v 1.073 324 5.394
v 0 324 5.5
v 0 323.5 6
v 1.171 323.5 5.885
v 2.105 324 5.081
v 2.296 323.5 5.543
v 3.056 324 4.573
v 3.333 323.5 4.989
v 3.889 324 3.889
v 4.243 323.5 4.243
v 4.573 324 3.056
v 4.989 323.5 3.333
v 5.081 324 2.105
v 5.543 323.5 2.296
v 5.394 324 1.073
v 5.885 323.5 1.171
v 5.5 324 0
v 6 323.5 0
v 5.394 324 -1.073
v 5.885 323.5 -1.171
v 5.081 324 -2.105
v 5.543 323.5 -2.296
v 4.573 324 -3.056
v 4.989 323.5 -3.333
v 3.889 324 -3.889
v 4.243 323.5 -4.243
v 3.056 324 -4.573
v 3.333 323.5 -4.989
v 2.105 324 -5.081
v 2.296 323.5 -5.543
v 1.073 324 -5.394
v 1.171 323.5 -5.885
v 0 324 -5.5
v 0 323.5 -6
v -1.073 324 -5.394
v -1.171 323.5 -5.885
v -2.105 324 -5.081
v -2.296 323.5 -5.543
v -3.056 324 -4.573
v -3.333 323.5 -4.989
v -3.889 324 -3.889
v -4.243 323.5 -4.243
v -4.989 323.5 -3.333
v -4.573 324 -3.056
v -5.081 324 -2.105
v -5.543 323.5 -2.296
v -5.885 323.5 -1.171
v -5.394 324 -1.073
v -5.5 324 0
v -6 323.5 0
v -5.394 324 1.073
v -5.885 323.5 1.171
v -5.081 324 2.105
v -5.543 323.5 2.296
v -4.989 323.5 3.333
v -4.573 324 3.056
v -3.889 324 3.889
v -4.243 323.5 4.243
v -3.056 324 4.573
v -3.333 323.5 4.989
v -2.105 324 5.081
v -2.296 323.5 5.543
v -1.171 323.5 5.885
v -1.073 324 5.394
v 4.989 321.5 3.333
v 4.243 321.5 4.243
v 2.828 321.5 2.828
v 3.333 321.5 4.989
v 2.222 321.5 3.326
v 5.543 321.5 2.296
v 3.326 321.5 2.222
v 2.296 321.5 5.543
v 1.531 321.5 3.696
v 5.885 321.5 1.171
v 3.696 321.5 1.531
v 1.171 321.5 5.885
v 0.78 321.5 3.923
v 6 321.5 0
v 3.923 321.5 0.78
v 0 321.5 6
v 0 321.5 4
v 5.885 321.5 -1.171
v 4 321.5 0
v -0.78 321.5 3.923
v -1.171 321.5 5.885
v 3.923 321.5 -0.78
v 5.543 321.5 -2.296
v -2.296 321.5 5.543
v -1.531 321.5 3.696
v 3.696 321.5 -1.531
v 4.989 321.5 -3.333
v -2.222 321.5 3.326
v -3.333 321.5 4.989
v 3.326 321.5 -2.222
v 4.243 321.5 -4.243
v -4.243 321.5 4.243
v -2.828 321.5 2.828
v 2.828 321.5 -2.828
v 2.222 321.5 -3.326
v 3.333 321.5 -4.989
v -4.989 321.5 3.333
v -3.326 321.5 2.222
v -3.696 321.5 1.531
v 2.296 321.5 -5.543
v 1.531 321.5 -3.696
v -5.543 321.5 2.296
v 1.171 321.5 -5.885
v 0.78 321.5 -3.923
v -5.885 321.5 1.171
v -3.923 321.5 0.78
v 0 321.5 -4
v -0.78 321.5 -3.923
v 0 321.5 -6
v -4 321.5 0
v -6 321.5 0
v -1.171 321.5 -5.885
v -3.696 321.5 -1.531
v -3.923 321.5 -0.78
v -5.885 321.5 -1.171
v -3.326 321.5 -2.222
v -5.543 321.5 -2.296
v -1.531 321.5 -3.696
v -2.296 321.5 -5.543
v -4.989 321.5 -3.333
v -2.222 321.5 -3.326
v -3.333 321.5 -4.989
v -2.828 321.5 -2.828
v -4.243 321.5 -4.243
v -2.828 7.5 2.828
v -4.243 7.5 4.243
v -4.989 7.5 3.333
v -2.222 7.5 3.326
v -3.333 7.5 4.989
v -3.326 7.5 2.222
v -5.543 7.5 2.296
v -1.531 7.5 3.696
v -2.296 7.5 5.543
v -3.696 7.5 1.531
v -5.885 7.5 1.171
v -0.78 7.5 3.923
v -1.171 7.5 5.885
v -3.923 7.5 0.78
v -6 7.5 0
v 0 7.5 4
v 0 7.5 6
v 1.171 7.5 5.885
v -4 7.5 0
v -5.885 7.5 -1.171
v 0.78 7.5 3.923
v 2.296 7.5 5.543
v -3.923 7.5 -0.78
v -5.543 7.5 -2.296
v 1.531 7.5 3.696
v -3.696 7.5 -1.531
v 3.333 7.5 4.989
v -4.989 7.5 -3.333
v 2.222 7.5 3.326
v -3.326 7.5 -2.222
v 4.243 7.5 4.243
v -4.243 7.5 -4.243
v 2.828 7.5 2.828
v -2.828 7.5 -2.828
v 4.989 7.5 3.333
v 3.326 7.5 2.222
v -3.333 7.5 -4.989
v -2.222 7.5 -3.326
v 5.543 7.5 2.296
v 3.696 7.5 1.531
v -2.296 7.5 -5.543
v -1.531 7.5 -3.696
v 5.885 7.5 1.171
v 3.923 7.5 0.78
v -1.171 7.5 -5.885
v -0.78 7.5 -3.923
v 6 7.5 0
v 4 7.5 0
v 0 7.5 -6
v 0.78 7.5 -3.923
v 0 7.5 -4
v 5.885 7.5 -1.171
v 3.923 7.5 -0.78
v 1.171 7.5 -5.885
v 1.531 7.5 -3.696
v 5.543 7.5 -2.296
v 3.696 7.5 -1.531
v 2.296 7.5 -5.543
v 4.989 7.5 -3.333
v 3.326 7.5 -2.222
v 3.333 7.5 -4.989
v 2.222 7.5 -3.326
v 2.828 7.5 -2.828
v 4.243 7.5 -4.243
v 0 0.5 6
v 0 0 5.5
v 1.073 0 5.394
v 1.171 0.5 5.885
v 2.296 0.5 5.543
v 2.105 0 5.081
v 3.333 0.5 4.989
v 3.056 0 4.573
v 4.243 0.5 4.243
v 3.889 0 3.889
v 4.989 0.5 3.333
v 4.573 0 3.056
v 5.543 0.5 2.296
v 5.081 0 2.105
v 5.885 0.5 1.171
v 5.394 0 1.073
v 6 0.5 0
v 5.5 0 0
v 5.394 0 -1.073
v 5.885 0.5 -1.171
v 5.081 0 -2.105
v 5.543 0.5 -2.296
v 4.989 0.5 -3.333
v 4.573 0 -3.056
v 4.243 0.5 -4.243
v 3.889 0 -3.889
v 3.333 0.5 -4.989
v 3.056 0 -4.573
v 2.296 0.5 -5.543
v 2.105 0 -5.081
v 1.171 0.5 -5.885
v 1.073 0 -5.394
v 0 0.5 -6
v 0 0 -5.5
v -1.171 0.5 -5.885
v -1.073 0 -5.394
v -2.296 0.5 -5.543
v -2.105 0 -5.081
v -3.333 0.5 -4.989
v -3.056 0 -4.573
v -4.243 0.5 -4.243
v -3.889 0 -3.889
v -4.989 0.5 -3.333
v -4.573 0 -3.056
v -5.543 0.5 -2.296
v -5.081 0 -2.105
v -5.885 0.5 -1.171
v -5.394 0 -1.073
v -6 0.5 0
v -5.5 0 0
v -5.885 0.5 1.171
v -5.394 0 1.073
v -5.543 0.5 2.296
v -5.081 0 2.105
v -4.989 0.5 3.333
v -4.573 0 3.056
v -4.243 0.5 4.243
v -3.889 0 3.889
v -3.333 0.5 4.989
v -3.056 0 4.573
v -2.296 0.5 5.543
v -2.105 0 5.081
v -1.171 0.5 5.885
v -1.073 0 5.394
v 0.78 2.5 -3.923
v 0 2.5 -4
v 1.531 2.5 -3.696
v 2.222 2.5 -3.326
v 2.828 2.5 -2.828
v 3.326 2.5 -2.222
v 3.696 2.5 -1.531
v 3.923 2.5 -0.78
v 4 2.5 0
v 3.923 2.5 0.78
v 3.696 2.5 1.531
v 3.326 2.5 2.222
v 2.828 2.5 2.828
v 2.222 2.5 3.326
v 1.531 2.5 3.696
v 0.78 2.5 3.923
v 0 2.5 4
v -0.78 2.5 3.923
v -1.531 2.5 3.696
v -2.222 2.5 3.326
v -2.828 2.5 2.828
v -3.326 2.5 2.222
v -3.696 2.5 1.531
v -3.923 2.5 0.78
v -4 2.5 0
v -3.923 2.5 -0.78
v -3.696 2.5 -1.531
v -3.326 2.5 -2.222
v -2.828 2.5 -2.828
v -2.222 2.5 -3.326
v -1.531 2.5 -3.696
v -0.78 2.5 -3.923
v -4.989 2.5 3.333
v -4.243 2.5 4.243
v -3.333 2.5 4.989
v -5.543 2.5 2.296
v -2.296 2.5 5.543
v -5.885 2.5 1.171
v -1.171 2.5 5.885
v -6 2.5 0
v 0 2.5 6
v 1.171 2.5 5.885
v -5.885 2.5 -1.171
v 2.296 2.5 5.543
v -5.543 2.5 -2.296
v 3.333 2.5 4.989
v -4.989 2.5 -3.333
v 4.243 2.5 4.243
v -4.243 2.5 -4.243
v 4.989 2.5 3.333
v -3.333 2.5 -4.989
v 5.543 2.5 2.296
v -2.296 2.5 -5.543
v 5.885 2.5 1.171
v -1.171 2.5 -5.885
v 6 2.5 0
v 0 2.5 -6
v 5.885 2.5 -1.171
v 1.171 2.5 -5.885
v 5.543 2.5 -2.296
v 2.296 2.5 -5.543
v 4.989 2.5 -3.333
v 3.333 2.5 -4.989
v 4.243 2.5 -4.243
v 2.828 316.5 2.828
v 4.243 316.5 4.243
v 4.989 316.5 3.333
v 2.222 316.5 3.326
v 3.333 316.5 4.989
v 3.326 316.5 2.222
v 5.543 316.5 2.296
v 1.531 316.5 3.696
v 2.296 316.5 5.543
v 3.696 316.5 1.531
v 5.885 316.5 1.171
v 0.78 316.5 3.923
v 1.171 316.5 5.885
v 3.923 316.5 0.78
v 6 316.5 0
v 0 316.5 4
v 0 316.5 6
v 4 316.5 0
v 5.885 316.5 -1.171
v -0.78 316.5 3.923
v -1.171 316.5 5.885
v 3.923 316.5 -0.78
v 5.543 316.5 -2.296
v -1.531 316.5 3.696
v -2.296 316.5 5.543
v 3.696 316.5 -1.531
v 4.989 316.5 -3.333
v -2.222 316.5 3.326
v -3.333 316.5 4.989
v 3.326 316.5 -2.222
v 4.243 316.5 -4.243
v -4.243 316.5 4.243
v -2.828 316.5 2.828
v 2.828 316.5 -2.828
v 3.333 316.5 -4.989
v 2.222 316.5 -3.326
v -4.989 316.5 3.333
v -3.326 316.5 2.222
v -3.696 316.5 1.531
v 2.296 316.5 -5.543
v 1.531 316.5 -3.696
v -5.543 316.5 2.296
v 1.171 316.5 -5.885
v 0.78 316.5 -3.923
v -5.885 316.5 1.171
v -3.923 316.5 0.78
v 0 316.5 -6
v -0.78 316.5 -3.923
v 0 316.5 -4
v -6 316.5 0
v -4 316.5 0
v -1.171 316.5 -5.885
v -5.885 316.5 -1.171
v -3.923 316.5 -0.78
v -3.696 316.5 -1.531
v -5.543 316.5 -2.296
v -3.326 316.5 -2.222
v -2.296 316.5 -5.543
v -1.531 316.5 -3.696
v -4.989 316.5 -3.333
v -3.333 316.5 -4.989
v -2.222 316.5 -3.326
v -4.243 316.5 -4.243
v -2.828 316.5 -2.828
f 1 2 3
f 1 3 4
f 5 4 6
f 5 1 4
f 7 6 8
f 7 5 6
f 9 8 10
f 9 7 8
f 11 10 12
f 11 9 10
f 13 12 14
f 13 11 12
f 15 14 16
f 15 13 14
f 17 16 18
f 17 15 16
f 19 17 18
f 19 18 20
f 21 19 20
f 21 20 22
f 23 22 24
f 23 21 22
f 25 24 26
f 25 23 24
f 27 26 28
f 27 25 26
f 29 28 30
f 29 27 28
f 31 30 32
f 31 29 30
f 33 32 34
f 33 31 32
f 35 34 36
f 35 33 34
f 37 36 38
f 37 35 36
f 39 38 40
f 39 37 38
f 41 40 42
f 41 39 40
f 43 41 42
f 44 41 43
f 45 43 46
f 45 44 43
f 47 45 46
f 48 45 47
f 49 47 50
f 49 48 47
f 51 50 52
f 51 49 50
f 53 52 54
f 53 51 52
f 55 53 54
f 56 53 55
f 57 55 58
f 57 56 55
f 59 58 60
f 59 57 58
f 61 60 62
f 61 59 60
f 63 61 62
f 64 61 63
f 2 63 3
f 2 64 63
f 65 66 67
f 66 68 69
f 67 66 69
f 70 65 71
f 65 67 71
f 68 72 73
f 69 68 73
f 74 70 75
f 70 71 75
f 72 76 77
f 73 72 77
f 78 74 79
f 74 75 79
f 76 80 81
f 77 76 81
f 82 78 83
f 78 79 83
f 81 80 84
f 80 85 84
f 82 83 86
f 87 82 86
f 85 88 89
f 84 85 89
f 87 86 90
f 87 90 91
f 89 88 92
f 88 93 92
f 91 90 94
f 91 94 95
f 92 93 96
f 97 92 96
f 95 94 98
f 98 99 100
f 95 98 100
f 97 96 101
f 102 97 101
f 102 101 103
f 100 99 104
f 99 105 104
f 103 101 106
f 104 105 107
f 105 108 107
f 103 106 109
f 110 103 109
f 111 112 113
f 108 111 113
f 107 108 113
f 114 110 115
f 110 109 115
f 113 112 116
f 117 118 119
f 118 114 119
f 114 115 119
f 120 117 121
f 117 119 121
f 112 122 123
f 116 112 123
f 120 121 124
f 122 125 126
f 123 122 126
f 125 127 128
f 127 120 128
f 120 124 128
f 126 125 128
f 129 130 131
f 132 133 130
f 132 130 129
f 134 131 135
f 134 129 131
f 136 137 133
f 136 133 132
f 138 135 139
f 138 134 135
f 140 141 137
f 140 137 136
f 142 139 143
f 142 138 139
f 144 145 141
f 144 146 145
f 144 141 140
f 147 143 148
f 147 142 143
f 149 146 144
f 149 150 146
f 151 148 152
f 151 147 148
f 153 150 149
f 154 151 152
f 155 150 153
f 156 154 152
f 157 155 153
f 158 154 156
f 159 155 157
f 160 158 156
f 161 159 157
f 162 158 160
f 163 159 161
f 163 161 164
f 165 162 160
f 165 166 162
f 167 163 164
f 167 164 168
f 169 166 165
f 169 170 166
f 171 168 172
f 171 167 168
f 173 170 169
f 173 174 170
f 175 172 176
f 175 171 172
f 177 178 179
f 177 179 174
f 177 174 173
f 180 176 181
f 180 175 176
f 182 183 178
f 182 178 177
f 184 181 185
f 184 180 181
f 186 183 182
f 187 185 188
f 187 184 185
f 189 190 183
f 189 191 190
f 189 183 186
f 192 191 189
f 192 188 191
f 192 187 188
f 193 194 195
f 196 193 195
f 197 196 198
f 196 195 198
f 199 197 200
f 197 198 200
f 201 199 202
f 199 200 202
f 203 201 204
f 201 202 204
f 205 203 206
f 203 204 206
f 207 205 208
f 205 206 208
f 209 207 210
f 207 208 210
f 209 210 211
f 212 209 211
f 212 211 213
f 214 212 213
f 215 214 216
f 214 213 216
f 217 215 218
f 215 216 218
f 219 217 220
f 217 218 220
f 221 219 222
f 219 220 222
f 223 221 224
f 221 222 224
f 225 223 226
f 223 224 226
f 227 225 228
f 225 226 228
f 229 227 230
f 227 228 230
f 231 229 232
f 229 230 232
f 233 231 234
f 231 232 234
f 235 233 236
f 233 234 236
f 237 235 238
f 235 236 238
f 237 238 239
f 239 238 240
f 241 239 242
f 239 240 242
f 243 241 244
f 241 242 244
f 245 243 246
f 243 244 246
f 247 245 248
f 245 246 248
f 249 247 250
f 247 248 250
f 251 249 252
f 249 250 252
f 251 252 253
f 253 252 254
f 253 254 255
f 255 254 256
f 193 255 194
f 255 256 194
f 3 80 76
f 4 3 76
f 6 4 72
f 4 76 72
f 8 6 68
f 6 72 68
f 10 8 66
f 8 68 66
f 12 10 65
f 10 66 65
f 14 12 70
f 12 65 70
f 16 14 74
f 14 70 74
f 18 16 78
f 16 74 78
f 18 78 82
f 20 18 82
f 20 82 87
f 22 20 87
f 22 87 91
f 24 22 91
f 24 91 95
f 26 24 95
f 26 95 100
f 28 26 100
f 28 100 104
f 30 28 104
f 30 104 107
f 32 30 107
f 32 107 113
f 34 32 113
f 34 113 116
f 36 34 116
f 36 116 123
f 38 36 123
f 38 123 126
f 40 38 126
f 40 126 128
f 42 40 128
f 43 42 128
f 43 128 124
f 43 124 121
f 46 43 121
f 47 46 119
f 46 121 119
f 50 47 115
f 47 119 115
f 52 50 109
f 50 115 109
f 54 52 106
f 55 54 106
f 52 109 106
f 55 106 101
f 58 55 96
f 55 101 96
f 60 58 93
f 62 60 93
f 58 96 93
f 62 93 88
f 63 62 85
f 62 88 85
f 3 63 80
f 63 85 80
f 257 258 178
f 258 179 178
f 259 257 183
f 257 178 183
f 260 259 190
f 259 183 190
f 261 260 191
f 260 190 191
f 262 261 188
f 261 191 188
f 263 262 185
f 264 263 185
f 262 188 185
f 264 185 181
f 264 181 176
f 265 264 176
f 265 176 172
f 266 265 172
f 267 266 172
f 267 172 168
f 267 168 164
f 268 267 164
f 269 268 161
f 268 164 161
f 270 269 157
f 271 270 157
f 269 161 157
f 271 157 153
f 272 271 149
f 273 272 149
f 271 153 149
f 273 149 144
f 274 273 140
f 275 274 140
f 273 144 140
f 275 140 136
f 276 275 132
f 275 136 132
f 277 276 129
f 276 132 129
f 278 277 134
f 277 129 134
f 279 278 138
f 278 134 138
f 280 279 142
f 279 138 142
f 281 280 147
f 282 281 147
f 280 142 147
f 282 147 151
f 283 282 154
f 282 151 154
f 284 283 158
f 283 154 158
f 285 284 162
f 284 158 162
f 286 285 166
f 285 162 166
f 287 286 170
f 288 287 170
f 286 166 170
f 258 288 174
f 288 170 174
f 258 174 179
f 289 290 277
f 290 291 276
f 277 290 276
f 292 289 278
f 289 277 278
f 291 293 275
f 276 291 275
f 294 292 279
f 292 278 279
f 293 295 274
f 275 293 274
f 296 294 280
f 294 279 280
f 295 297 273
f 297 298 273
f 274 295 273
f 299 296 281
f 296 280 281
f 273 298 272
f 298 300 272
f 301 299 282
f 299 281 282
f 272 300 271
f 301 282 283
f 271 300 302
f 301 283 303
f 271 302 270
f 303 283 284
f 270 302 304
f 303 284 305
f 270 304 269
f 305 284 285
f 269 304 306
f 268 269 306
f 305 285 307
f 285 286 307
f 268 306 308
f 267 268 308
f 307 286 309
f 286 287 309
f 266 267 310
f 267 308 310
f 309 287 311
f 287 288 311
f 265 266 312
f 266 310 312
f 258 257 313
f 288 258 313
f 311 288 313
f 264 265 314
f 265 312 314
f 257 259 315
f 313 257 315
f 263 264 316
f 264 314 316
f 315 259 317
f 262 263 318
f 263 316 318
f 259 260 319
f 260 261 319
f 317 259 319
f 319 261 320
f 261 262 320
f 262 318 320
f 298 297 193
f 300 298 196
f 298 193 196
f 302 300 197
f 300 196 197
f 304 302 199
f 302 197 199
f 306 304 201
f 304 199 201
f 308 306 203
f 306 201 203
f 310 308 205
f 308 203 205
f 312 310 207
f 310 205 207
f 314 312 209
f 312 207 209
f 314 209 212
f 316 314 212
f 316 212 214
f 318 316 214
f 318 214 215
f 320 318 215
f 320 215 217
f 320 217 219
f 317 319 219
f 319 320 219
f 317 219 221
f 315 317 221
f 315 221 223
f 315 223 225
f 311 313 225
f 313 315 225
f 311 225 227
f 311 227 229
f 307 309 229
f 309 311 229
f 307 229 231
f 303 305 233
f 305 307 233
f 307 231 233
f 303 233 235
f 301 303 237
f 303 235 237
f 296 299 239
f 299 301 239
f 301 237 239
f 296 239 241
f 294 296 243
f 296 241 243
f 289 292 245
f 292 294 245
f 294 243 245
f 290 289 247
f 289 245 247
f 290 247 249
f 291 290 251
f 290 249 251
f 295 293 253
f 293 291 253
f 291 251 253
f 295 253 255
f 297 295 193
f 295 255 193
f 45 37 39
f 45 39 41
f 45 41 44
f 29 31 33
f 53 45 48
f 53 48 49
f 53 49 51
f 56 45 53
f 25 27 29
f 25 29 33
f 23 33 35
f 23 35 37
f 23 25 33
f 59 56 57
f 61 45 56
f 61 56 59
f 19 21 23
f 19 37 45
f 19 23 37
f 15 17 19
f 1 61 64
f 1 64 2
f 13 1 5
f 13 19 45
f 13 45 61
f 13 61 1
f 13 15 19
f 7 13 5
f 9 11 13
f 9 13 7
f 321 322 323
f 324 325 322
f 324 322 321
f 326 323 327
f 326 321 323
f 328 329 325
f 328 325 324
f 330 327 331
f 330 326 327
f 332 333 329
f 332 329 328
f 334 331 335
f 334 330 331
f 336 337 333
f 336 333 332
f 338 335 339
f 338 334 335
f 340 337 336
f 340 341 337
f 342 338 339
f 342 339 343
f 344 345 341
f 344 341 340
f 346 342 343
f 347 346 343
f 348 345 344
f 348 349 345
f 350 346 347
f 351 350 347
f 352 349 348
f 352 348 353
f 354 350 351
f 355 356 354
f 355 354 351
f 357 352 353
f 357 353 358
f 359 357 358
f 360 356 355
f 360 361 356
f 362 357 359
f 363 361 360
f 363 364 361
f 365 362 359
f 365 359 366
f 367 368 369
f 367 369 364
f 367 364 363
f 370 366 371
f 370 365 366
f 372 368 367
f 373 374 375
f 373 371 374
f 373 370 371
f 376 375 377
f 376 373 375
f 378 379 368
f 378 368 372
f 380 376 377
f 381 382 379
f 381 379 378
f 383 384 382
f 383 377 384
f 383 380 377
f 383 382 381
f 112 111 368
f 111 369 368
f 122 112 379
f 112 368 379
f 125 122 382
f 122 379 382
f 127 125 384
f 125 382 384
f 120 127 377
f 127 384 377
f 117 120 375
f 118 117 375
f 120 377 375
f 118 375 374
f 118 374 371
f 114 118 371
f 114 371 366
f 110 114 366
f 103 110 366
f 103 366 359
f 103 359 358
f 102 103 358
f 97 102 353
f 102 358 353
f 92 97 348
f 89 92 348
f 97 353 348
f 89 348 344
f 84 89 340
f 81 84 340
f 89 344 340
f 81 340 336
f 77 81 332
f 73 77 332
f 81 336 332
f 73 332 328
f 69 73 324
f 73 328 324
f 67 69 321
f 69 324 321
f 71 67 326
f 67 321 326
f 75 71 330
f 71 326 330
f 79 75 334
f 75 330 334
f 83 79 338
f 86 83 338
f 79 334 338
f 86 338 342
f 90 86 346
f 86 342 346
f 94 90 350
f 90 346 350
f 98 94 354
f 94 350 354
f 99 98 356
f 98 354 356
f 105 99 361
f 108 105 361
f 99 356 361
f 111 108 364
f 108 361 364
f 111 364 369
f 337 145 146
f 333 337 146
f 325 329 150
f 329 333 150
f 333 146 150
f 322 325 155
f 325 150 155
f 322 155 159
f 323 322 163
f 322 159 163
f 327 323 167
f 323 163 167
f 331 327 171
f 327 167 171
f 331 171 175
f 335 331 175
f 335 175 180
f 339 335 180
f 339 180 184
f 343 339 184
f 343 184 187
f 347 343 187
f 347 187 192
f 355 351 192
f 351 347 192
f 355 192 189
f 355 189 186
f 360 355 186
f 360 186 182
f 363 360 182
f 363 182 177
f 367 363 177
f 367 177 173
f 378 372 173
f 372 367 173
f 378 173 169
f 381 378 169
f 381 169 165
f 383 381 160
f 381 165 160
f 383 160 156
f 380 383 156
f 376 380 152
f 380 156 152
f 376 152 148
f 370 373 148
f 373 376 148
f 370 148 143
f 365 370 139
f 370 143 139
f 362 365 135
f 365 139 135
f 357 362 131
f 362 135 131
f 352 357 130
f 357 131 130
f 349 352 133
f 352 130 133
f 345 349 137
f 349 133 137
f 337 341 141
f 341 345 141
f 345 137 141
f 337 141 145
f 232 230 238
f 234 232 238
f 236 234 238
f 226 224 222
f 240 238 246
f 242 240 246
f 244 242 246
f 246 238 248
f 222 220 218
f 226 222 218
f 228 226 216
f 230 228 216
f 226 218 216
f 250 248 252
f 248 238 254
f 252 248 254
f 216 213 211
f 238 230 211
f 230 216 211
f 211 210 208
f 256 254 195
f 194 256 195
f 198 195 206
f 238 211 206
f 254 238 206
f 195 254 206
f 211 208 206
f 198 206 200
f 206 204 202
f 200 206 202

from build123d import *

# Parameters (mm, degrees)
ESBO_O2_R                = 6
RESSALTO_EXTRUS_O1_DEPTH = 324
CHANFRO1_SIZE            = 0.5
ESBO_O3_R                = 6
ESBO_O3_R_2              = 4
CORTE_EXTRUS_O1_DEPTH    = 2.5
ESBO_O4_R                = 6
ESBO_O4_R_2              = 4
CORTE_EXTRUS_O2_DEPTH    = 2.5


with BuildPart() as part:
    # Esboço2 → Ressalto-extrusão1 (new body)
    with BuildSketch(Plane(origin=(0, 0, 0), x_dir=(1, 0, 0), z_dir=(0, 1, 0))):
        with Locations(Location((0, 0, 0), (0, 0, 270))):
            Circle(ESBO_O2_R)
    extrude(amount=RESSALTO_EXTRUS_O1_DEPTH)

    # Chanfro1
    chanfro1_edges = [part.edges().sort_by_distance(p)[0] for p in [
        (0, 0, -6),
        (0, 324, -6),
    ]]
    chamfer(chanfro1_edges, length=CHANFRO1_SIZE)

    # Esboço3 → Corte-extrusão1 (cut, symmetric)
    with BuildSketch(Plane(origin=(0, 5, 0), x_dir=(-1, 0, 0), z_dir=(0, -1, 0))):
        with Locations(Location((0, 0, 0), (0, 0, 90))):
            Circle(ESBO_O3_R)
        with Locations(Location((0, 0, 0), (0, 0, 90))):
            Circle(ESBO_O3_R_2, mode=Mode.SUBTRACT)
    extrude(amount=CORTE_EXTRUS_O1_DEPTH, both=True, mode=Mode.SUBTRACT)

    # Esboço4 → Corte-extrusão2 (cut, symmetric)
    with BuildSketch(Plane(origin=(0, 319, 0), x_dir=(1, 0, 0), z_dir=(0, 1, 0))):
        with Locations(Location((0, 0, 0), (0, 0, 90))):
            Circle(ESBO_O4_R)
        with Locations(Location((0, 0, 0), (0, 0, 90))):
            Circle(ESBO_O4_R_2, mode=Mode.SUBTRACT)
    extrude(amount=CORTE_EXTRUS_O2_DEPTH, both=True, mode=Mode.SUBTRACT)


solid = part.part
